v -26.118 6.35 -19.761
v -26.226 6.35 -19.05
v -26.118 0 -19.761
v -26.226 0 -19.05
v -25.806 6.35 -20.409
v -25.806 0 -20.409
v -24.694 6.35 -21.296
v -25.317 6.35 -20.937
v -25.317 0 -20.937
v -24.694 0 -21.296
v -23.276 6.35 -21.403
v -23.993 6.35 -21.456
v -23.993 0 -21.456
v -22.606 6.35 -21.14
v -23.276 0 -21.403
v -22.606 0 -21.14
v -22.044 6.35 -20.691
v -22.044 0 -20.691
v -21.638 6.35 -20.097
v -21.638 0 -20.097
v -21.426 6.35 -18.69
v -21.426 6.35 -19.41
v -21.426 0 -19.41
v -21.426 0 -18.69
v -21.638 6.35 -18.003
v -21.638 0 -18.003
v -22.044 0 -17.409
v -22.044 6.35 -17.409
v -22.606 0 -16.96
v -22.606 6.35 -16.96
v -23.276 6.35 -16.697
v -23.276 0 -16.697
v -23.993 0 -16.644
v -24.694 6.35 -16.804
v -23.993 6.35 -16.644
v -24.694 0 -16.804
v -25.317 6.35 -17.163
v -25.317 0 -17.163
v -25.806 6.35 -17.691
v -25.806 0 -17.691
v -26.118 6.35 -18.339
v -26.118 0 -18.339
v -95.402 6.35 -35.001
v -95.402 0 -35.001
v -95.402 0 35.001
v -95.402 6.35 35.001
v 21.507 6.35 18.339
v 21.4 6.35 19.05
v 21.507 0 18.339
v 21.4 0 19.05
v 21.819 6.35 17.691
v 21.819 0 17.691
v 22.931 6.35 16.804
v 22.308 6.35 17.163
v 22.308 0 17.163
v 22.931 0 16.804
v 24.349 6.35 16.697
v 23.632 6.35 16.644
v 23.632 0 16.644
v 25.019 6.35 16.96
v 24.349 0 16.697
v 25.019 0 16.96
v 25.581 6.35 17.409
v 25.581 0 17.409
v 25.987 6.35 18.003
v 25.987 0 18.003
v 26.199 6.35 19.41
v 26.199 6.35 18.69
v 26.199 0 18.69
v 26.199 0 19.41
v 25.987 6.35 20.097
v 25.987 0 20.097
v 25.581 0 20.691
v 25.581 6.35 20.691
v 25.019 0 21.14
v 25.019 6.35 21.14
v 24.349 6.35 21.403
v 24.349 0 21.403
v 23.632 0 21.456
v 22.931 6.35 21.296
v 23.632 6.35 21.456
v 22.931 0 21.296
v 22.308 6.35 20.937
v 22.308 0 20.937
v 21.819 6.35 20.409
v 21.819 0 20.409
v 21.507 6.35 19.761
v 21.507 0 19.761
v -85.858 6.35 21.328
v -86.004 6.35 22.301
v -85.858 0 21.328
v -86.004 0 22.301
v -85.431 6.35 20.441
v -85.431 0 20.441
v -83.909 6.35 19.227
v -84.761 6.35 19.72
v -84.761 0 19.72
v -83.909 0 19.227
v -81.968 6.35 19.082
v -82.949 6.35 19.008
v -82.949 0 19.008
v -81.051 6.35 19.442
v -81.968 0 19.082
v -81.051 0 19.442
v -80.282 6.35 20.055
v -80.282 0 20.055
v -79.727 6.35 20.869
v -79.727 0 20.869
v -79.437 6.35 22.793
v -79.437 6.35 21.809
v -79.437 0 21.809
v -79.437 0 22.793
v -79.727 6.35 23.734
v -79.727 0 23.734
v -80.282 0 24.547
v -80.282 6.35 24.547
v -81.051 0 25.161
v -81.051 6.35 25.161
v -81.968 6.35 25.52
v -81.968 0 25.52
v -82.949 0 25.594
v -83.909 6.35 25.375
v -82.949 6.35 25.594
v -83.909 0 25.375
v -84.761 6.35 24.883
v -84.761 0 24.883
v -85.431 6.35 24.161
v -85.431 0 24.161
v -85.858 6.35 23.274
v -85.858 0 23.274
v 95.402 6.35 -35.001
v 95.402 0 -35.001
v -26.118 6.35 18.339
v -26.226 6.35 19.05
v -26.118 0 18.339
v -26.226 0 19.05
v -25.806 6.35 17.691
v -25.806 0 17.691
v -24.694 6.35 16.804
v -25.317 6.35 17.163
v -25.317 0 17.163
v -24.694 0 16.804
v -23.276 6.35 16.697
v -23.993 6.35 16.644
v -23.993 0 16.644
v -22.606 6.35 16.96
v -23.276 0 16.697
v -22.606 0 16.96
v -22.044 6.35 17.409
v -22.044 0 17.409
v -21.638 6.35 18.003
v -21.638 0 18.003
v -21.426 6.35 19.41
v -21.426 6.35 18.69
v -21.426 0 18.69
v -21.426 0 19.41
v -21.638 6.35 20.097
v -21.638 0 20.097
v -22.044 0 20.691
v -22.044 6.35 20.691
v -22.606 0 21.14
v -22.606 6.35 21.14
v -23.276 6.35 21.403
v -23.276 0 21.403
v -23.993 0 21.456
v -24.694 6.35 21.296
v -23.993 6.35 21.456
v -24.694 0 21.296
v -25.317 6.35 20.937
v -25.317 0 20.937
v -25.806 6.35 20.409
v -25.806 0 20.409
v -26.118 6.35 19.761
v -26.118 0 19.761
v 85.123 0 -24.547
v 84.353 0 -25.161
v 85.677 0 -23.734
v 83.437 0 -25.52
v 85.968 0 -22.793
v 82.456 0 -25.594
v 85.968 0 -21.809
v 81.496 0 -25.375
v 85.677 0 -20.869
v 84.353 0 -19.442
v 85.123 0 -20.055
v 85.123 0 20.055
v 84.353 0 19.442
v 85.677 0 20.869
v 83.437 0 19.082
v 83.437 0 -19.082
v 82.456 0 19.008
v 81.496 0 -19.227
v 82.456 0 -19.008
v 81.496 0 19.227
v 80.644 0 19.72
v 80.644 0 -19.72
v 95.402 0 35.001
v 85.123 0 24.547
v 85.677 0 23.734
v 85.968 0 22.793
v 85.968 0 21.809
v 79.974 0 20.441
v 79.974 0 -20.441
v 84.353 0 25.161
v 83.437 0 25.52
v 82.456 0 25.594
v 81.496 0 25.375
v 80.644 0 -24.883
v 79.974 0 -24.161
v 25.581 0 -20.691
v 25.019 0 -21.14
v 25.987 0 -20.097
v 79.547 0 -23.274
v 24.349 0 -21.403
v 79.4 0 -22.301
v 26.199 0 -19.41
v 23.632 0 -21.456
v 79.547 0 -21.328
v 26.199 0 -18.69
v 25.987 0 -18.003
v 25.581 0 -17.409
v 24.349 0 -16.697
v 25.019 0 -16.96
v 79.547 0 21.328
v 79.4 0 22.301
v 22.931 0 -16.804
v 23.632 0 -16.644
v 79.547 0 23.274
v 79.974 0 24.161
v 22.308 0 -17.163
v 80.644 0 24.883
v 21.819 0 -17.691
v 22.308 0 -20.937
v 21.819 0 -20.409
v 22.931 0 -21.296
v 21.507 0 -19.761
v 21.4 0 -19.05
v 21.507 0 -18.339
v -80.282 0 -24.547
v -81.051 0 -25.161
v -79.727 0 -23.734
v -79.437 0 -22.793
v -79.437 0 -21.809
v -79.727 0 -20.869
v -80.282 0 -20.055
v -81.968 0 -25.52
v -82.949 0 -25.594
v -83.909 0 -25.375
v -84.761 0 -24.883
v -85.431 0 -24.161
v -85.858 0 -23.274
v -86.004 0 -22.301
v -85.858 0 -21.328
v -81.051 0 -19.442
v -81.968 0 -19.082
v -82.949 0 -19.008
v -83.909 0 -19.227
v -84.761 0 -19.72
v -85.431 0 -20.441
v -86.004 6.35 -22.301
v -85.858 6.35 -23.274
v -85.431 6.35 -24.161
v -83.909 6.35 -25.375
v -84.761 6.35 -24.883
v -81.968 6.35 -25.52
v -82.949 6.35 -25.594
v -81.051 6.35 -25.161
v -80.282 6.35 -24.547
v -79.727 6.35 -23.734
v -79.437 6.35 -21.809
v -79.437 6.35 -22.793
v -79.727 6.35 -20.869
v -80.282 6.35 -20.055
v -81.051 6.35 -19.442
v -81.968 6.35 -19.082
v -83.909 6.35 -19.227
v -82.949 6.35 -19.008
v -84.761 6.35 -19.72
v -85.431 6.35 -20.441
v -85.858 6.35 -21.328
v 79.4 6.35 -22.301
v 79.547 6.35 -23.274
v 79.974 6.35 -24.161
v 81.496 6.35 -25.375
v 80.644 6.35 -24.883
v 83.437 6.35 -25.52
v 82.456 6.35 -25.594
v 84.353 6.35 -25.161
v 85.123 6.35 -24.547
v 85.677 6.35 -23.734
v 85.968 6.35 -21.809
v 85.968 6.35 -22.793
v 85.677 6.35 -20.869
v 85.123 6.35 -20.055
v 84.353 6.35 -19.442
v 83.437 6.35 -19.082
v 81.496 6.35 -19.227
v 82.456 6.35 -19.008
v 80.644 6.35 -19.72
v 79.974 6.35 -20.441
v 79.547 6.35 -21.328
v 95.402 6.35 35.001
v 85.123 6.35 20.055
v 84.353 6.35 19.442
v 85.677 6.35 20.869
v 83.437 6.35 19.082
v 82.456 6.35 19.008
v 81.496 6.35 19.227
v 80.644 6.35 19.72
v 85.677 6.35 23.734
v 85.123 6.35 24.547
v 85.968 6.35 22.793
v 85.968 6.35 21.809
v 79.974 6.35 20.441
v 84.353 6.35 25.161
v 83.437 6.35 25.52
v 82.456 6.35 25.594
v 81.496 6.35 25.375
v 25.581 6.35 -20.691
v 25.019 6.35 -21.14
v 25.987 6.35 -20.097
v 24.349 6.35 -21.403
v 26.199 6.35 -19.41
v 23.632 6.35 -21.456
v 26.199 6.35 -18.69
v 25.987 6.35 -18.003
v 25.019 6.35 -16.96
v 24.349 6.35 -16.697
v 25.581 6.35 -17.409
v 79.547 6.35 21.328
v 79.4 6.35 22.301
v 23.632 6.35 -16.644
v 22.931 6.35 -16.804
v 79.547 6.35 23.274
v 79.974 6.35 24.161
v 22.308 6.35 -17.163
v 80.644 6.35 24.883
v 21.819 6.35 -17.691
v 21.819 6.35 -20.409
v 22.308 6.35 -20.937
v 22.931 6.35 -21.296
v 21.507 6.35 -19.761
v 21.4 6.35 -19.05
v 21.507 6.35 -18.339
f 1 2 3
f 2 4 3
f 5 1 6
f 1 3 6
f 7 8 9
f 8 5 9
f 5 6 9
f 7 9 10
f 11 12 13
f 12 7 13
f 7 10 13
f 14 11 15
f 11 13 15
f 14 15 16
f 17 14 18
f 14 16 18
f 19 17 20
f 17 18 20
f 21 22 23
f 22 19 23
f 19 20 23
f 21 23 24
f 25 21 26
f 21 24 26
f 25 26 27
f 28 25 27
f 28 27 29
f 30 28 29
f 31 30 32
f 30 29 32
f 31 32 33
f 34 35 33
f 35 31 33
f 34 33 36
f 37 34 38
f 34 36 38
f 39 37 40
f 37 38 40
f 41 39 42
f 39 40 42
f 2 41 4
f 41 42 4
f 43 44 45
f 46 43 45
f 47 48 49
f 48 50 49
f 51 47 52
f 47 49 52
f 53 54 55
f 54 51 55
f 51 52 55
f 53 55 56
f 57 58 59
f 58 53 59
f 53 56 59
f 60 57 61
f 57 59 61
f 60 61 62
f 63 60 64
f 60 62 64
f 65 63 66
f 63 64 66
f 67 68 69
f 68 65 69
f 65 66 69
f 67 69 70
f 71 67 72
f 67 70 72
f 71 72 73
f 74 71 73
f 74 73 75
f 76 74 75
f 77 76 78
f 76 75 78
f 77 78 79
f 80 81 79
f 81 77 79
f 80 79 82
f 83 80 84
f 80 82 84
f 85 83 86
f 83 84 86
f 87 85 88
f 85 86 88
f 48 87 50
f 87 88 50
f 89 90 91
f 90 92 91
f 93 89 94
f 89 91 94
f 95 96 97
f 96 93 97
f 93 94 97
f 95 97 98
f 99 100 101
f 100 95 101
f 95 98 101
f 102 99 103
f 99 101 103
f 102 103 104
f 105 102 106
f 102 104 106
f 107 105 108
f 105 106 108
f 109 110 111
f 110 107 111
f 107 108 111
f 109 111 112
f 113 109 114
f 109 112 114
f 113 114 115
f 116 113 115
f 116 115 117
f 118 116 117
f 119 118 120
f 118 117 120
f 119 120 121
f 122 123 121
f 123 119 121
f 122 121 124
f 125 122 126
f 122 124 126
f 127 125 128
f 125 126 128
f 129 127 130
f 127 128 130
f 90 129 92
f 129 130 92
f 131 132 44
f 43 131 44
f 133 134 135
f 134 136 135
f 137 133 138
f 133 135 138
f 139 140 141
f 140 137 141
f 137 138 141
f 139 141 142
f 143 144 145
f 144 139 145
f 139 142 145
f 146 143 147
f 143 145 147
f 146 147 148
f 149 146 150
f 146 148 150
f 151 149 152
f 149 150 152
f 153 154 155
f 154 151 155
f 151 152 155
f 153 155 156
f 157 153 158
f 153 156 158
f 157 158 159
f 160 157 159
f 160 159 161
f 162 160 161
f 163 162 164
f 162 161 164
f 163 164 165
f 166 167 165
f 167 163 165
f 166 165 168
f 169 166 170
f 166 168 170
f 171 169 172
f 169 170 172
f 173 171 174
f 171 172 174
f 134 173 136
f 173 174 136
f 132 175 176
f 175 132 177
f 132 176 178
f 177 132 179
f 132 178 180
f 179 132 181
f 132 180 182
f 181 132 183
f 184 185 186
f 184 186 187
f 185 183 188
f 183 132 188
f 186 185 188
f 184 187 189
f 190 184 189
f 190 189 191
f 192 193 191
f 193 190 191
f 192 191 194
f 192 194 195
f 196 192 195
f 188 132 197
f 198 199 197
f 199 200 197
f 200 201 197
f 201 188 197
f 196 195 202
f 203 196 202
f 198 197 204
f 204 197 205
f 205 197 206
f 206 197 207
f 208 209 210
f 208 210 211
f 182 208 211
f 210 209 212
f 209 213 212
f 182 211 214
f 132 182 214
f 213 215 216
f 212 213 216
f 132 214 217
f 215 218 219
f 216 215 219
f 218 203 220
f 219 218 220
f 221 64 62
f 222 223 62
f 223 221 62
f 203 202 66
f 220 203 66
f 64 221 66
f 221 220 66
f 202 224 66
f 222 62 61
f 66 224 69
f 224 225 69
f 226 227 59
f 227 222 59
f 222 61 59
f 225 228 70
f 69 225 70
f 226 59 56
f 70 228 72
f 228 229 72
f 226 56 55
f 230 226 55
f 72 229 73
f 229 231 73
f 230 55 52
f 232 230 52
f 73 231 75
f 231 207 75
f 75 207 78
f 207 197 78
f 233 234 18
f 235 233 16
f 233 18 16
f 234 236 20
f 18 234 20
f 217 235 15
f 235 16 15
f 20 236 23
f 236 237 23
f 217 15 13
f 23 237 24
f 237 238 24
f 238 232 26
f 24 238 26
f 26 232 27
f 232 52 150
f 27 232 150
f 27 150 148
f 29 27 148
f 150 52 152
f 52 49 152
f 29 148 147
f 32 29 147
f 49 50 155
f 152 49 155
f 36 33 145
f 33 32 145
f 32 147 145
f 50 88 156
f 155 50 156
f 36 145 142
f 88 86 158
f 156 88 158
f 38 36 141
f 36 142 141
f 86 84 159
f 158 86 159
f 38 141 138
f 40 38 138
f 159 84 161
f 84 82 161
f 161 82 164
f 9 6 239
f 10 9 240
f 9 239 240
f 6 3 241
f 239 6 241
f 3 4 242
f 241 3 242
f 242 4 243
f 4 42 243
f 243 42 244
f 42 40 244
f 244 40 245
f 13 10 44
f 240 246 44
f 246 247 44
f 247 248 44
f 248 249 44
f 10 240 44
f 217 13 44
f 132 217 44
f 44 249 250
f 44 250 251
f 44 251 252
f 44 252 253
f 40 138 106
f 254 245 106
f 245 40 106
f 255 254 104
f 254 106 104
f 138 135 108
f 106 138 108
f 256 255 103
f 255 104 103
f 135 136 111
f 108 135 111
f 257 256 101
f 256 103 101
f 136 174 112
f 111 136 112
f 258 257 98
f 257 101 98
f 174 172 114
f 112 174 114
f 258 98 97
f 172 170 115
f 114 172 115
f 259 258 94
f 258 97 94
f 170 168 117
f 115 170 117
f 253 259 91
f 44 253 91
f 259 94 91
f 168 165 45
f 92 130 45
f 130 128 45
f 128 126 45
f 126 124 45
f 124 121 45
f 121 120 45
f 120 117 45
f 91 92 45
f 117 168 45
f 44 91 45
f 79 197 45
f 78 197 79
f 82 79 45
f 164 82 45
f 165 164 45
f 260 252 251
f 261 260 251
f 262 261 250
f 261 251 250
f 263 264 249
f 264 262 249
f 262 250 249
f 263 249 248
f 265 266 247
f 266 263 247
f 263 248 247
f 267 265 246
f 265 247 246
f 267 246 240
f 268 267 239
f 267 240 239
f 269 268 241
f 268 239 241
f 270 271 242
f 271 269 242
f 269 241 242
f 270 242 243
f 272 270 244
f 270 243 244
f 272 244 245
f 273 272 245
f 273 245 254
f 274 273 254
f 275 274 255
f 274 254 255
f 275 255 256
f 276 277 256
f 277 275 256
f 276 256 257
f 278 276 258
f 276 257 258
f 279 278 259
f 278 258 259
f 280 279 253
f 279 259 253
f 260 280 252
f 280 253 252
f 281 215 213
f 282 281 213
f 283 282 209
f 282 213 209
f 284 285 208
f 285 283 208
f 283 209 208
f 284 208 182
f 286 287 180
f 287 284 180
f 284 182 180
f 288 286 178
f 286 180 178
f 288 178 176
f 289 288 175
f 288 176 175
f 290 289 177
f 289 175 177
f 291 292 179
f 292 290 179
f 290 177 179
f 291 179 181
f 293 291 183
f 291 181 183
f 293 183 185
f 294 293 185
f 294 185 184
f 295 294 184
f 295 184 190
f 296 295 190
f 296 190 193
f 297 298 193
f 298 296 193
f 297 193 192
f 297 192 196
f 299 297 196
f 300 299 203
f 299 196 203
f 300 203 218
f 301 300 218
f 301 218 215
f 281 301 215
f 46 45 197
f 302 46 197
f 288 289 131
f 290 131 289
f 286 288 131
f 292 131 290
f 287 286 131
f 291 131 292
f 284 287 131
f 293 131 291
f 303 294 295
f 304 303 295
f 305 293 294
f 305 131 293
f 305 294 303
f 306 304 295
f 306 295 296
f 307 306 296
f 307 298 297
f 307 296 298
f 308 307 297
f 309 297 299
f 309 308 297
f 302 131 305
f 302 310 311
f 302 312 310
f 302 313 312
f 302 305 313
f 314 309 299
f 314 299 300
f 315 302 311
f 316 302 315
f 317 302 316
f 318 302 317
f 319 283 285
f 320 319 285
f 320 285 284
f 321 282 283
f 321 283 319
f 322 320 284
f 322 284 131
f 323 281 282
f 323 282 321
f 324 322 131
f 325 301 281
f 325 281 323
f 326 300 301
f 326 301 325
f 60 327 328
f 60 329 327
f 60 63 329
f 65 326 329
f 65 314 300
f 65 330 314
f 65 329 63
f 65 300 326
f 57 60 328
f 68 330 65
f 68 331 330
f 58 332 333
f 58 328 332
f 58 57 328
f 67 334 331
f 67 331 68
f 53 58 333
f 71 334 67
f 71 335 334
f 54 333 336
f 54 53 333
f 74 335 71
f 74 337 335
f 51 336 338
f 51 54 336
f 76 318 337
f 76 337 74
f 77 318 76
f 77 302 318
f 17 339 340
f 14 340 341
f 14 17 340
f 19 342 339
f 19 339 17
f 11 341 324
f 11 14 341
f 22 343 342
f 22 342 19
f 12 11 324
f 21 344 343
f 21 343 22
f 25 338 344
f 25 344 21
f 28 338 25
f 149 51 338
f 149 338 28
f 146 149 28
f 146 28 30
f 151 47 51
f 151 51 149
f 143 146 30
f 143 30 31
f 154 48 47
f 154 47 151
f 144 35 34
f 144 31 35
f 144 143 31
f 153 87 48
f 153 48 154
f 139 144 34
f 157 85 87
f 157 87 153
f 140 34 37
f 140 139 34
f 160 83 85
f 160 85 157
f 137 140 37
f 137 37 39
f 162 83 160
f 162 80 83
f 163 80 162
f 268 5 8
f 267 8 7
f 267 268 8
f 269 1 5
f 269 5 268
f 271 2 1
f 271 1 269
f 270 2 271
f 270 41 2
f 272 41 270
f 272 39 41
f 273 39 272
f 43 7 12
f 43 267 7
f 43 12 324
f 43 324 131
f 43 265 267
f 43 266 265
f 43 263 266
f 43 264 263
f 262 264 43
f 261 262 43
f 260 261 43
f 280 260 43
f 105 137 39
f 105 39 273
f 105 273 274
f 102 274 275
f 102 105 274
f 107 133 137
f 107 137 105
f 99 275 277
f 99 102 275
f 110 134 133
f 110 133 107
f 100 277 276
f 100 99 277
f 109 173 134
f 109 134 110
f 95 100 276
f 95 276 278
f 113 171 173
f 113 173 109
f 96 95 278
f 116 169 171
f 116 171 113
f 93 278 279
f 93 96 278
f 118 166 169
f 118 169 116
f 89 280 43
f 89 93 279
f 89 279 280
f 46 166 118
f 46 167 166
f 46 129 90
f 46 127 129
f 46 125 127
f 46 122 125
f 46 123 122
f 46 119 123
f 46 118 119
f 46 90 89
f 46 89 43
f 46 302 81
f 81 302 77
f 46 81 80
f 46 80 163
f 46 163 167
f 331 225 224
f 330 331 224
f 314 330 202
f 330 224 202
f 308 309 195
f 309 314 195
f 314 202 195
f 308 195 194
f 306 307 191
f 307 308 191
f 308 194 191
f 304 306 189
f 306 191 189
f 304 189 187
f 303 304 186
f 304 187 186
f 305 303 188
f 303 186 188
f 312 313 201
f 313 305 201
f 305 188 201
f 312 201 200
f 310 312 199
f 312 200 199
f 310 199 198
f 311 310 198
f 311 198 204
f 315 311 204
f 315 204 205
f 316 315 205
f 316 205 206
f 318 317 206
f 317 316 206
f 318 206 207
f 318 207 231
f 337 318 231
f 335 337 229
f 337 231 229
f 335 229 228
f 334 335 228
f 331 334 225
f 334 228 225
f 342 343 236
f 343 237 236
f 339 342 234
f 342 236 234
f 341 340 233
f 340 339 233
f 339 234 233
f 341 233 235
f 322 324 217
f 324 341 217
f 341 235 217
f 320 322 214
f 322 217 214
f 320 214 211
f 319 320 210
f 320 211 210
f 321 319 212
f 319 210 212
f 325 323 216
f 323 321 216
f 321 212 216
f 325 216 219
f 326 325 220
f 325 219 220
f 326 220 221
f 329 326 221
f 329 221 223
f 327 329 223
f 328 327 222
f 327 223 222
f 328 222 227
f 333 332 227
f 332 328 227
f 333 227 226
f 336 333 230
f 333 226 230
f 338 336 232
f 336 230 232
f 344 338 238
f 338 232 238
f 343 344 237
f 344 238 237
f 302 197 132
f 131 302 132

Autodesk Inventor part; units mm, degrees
ref_plane "YZ Plane" through (0, 0, 0) normal (1, 0, 0) x (0, 1, 0)
ref_plane "XZ Plane" through (0, 0, 0) normal (0, 1, 0) x (-1, 0, 0)
ref_plane "XY Plane" through (0, 0, 0) normal (0, 0, 1) x (1, 0, 0)
sketch "Sketch1" plane through (0, 0, 0) normal (0, 1, 0) x (-1, 0, 0)
  line L0 (95.4024, 35.0012) -> (-95.4024, 35.0012)
  line L1 (-95.4024, 35.0012) -> (-95.4024, -35.0012)
  line L2 (-95.4024, -35.0012) -> (95.4024, -35.0012)
  line L3 (95.4024, -35.0012) -> (95.4024, 35.0012)
  line L4 (95.4024, 35.0012) -> (-95.4024, -35.0012) construction
  line L5 (-95.4024, 35.0012) -> (95.4024, -35.0012) construction
  circle A0 centre (82.7024, -22.3012) radius 3.302
  circle A1 centre (-82.7024, -22.3012) radius 3.302
  circle A2 centre (-82.7024, 22.3012) radius 3.302
  circle A3 centre (82.7024, 22.3012) radius 3.302
  line L6 (40.9111, -19.05) -> (-47.9889, -19.05) construction
  line L7 (40.9111, 19.05) -> (-47.9889, 19.05) construction
  circle A4 centre (23.8125, -19.05) radius 2.413
  circle A5 centre (-23.8125, -19.05) radius 2.413
  circle A6 centre (23.8125, 19.05) radius 2.413
  circle A7 centre (-23.8125, 19.05) radius 2.413
  point P0 (0, 0)
  dimension "d0" = 190.8048
  dimension "d1" = 70.0024
  dimension "d2" = 6.604
  dimension "d3" = 12.7
  dimension "d4" = 12.7
  dimension "d5" = 6.604
  dimension "d6" = 12.7
  dimension "d7" = 6.604
  dimension "d8" = 12.7
  dimension "d9" = 6.604
  dimension "d10" = 88.9
  dimension "d11" = 88.9
  dimension "d12" = 38.1
  dimension "d13" = 19.05
  dimension "d14" = 4.826
  dimension "d15" = 4.826
  dimension "d16" = 47.625
  dimension "d17" = 23.8125
  dimension "d18" = 4.826
  dimension "d19" = 4.826
extrude "Extrusion1" add sketch "Sketch1" along normal blind 6.35
equation "\"d13\" = 0.5 * d12"
equation "\"d17\" = 0.5 * d16"
properties part number "SequenceMachine_ManifoldPlate"
